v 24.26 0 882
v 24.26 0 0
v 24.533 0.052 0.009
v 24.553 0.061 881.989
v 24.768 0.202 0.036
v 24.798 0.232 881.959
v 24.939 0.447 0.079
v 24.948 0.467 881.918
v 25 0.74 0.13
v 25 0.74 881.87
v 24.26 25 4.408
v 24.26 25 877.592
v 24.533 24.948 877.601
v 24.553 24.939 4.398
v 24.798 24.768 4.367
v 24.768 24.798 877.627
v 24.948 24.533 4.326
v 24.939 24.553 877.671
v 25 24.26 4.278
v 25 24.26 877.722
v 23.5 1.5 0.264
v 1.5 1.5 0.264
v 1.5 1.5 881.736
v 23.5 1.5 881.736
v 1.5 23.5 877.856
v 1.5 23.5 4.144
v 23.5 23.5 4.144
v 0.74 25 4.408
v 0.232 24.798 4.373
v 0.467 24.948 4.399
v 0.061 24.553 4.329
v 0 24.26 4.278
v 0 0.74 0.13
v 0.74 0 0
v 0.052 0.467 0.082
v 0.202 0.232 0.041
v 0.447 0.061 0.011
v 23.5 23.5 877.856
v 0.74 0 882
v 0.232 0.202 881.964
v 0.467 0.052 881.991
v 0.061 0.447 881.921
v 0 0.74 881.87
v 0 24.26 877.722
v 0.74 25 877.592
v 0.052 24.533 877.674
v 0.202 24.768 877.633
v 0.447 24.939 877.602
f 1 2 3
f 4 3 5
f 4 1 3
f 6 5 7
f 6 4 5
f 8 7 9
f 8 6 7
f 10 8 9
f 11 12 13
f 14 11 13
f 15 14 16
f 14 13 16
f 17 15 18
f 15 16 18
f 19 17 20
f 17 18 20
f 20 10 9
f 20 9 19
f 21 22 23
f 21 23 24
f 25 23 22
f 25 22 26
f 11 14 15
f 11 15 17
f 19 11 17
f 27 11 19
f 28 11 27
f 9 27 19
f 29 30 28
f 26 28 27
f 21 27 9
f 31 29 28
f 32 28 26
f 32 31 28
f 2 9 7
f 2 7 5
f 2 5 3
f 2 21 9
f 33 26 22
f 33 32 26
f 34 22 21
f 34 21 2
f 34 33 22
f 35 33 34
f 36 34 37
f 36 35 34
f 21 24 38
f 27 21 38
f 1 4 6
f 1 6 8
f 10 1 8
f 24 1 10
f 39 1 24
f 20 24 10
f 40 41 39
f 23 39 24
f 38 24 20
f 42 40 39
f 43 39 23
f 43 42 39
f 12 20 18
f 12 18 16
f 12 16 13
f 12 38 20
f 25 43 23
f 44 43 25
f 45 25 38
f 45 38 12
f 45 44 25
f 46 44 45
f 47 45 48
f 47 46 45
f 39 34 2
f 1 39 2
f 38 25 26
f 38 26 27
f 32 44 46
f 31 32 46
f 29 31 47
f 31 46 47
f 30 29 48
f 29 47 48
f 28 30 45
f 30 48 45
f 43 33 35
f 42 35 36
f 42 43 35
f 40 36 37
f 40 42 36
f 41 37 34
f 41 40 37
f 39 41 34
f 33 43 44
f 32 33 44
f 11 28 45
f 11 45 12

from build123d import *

# Parameters (mm, degrees)
SKETCH_W     = 25
SKETCH_H     = 25
SKETCH_W_2   = 22
SKETCH_H_2   = 22
PAD_DEPTH    = 882
FILLET_R     = 0.74
POCKET_DEPTH = 25.001


with BuildPart() as part:
    # Sketch → Pad (new body)
    with BuildSketch(Plane.XY):
        with Locations((12.5, 12.5)):
            Rectangle(SKETCH_W, SKETCH_H)
        with Locations((12.5, 12.5)):
            Rectangle(SKETCH_W_2, SKETCH_H_2, mode=Mode.SUBTRACT)
    extrude(amount=PAD_DEPTH)

    # Fillet
    fillet_edges = [part.edges().sort_by_distance(p)[0] for p in [
        (25, 0, 441),
        (0, 0, 441),
        (25, 25, 441),
        (0, 25, 441),
    ]]
    fillet(fillet_edges, radius=FILLET_R)

    # Sketch001 (on Face6 of Fillet) → Pocket (cut, through all)
    with BuildSketch(Plane(origin=(0, 0, 0), x_dir=(0, -1, 0), z_dir=(-1, 0, 0))):
        Polygon((0, 882), (-46.854502, 873.738287), (-48.019741, 909.975952), align=None)
        Polygon((0, 0), (-35.255848, -14.284037), (-39.064261, 6.888083), align=None)
    extrude(amount=-POCKET_DEPTH, mode=Mode.SUBTRACT)


solid = part.part
